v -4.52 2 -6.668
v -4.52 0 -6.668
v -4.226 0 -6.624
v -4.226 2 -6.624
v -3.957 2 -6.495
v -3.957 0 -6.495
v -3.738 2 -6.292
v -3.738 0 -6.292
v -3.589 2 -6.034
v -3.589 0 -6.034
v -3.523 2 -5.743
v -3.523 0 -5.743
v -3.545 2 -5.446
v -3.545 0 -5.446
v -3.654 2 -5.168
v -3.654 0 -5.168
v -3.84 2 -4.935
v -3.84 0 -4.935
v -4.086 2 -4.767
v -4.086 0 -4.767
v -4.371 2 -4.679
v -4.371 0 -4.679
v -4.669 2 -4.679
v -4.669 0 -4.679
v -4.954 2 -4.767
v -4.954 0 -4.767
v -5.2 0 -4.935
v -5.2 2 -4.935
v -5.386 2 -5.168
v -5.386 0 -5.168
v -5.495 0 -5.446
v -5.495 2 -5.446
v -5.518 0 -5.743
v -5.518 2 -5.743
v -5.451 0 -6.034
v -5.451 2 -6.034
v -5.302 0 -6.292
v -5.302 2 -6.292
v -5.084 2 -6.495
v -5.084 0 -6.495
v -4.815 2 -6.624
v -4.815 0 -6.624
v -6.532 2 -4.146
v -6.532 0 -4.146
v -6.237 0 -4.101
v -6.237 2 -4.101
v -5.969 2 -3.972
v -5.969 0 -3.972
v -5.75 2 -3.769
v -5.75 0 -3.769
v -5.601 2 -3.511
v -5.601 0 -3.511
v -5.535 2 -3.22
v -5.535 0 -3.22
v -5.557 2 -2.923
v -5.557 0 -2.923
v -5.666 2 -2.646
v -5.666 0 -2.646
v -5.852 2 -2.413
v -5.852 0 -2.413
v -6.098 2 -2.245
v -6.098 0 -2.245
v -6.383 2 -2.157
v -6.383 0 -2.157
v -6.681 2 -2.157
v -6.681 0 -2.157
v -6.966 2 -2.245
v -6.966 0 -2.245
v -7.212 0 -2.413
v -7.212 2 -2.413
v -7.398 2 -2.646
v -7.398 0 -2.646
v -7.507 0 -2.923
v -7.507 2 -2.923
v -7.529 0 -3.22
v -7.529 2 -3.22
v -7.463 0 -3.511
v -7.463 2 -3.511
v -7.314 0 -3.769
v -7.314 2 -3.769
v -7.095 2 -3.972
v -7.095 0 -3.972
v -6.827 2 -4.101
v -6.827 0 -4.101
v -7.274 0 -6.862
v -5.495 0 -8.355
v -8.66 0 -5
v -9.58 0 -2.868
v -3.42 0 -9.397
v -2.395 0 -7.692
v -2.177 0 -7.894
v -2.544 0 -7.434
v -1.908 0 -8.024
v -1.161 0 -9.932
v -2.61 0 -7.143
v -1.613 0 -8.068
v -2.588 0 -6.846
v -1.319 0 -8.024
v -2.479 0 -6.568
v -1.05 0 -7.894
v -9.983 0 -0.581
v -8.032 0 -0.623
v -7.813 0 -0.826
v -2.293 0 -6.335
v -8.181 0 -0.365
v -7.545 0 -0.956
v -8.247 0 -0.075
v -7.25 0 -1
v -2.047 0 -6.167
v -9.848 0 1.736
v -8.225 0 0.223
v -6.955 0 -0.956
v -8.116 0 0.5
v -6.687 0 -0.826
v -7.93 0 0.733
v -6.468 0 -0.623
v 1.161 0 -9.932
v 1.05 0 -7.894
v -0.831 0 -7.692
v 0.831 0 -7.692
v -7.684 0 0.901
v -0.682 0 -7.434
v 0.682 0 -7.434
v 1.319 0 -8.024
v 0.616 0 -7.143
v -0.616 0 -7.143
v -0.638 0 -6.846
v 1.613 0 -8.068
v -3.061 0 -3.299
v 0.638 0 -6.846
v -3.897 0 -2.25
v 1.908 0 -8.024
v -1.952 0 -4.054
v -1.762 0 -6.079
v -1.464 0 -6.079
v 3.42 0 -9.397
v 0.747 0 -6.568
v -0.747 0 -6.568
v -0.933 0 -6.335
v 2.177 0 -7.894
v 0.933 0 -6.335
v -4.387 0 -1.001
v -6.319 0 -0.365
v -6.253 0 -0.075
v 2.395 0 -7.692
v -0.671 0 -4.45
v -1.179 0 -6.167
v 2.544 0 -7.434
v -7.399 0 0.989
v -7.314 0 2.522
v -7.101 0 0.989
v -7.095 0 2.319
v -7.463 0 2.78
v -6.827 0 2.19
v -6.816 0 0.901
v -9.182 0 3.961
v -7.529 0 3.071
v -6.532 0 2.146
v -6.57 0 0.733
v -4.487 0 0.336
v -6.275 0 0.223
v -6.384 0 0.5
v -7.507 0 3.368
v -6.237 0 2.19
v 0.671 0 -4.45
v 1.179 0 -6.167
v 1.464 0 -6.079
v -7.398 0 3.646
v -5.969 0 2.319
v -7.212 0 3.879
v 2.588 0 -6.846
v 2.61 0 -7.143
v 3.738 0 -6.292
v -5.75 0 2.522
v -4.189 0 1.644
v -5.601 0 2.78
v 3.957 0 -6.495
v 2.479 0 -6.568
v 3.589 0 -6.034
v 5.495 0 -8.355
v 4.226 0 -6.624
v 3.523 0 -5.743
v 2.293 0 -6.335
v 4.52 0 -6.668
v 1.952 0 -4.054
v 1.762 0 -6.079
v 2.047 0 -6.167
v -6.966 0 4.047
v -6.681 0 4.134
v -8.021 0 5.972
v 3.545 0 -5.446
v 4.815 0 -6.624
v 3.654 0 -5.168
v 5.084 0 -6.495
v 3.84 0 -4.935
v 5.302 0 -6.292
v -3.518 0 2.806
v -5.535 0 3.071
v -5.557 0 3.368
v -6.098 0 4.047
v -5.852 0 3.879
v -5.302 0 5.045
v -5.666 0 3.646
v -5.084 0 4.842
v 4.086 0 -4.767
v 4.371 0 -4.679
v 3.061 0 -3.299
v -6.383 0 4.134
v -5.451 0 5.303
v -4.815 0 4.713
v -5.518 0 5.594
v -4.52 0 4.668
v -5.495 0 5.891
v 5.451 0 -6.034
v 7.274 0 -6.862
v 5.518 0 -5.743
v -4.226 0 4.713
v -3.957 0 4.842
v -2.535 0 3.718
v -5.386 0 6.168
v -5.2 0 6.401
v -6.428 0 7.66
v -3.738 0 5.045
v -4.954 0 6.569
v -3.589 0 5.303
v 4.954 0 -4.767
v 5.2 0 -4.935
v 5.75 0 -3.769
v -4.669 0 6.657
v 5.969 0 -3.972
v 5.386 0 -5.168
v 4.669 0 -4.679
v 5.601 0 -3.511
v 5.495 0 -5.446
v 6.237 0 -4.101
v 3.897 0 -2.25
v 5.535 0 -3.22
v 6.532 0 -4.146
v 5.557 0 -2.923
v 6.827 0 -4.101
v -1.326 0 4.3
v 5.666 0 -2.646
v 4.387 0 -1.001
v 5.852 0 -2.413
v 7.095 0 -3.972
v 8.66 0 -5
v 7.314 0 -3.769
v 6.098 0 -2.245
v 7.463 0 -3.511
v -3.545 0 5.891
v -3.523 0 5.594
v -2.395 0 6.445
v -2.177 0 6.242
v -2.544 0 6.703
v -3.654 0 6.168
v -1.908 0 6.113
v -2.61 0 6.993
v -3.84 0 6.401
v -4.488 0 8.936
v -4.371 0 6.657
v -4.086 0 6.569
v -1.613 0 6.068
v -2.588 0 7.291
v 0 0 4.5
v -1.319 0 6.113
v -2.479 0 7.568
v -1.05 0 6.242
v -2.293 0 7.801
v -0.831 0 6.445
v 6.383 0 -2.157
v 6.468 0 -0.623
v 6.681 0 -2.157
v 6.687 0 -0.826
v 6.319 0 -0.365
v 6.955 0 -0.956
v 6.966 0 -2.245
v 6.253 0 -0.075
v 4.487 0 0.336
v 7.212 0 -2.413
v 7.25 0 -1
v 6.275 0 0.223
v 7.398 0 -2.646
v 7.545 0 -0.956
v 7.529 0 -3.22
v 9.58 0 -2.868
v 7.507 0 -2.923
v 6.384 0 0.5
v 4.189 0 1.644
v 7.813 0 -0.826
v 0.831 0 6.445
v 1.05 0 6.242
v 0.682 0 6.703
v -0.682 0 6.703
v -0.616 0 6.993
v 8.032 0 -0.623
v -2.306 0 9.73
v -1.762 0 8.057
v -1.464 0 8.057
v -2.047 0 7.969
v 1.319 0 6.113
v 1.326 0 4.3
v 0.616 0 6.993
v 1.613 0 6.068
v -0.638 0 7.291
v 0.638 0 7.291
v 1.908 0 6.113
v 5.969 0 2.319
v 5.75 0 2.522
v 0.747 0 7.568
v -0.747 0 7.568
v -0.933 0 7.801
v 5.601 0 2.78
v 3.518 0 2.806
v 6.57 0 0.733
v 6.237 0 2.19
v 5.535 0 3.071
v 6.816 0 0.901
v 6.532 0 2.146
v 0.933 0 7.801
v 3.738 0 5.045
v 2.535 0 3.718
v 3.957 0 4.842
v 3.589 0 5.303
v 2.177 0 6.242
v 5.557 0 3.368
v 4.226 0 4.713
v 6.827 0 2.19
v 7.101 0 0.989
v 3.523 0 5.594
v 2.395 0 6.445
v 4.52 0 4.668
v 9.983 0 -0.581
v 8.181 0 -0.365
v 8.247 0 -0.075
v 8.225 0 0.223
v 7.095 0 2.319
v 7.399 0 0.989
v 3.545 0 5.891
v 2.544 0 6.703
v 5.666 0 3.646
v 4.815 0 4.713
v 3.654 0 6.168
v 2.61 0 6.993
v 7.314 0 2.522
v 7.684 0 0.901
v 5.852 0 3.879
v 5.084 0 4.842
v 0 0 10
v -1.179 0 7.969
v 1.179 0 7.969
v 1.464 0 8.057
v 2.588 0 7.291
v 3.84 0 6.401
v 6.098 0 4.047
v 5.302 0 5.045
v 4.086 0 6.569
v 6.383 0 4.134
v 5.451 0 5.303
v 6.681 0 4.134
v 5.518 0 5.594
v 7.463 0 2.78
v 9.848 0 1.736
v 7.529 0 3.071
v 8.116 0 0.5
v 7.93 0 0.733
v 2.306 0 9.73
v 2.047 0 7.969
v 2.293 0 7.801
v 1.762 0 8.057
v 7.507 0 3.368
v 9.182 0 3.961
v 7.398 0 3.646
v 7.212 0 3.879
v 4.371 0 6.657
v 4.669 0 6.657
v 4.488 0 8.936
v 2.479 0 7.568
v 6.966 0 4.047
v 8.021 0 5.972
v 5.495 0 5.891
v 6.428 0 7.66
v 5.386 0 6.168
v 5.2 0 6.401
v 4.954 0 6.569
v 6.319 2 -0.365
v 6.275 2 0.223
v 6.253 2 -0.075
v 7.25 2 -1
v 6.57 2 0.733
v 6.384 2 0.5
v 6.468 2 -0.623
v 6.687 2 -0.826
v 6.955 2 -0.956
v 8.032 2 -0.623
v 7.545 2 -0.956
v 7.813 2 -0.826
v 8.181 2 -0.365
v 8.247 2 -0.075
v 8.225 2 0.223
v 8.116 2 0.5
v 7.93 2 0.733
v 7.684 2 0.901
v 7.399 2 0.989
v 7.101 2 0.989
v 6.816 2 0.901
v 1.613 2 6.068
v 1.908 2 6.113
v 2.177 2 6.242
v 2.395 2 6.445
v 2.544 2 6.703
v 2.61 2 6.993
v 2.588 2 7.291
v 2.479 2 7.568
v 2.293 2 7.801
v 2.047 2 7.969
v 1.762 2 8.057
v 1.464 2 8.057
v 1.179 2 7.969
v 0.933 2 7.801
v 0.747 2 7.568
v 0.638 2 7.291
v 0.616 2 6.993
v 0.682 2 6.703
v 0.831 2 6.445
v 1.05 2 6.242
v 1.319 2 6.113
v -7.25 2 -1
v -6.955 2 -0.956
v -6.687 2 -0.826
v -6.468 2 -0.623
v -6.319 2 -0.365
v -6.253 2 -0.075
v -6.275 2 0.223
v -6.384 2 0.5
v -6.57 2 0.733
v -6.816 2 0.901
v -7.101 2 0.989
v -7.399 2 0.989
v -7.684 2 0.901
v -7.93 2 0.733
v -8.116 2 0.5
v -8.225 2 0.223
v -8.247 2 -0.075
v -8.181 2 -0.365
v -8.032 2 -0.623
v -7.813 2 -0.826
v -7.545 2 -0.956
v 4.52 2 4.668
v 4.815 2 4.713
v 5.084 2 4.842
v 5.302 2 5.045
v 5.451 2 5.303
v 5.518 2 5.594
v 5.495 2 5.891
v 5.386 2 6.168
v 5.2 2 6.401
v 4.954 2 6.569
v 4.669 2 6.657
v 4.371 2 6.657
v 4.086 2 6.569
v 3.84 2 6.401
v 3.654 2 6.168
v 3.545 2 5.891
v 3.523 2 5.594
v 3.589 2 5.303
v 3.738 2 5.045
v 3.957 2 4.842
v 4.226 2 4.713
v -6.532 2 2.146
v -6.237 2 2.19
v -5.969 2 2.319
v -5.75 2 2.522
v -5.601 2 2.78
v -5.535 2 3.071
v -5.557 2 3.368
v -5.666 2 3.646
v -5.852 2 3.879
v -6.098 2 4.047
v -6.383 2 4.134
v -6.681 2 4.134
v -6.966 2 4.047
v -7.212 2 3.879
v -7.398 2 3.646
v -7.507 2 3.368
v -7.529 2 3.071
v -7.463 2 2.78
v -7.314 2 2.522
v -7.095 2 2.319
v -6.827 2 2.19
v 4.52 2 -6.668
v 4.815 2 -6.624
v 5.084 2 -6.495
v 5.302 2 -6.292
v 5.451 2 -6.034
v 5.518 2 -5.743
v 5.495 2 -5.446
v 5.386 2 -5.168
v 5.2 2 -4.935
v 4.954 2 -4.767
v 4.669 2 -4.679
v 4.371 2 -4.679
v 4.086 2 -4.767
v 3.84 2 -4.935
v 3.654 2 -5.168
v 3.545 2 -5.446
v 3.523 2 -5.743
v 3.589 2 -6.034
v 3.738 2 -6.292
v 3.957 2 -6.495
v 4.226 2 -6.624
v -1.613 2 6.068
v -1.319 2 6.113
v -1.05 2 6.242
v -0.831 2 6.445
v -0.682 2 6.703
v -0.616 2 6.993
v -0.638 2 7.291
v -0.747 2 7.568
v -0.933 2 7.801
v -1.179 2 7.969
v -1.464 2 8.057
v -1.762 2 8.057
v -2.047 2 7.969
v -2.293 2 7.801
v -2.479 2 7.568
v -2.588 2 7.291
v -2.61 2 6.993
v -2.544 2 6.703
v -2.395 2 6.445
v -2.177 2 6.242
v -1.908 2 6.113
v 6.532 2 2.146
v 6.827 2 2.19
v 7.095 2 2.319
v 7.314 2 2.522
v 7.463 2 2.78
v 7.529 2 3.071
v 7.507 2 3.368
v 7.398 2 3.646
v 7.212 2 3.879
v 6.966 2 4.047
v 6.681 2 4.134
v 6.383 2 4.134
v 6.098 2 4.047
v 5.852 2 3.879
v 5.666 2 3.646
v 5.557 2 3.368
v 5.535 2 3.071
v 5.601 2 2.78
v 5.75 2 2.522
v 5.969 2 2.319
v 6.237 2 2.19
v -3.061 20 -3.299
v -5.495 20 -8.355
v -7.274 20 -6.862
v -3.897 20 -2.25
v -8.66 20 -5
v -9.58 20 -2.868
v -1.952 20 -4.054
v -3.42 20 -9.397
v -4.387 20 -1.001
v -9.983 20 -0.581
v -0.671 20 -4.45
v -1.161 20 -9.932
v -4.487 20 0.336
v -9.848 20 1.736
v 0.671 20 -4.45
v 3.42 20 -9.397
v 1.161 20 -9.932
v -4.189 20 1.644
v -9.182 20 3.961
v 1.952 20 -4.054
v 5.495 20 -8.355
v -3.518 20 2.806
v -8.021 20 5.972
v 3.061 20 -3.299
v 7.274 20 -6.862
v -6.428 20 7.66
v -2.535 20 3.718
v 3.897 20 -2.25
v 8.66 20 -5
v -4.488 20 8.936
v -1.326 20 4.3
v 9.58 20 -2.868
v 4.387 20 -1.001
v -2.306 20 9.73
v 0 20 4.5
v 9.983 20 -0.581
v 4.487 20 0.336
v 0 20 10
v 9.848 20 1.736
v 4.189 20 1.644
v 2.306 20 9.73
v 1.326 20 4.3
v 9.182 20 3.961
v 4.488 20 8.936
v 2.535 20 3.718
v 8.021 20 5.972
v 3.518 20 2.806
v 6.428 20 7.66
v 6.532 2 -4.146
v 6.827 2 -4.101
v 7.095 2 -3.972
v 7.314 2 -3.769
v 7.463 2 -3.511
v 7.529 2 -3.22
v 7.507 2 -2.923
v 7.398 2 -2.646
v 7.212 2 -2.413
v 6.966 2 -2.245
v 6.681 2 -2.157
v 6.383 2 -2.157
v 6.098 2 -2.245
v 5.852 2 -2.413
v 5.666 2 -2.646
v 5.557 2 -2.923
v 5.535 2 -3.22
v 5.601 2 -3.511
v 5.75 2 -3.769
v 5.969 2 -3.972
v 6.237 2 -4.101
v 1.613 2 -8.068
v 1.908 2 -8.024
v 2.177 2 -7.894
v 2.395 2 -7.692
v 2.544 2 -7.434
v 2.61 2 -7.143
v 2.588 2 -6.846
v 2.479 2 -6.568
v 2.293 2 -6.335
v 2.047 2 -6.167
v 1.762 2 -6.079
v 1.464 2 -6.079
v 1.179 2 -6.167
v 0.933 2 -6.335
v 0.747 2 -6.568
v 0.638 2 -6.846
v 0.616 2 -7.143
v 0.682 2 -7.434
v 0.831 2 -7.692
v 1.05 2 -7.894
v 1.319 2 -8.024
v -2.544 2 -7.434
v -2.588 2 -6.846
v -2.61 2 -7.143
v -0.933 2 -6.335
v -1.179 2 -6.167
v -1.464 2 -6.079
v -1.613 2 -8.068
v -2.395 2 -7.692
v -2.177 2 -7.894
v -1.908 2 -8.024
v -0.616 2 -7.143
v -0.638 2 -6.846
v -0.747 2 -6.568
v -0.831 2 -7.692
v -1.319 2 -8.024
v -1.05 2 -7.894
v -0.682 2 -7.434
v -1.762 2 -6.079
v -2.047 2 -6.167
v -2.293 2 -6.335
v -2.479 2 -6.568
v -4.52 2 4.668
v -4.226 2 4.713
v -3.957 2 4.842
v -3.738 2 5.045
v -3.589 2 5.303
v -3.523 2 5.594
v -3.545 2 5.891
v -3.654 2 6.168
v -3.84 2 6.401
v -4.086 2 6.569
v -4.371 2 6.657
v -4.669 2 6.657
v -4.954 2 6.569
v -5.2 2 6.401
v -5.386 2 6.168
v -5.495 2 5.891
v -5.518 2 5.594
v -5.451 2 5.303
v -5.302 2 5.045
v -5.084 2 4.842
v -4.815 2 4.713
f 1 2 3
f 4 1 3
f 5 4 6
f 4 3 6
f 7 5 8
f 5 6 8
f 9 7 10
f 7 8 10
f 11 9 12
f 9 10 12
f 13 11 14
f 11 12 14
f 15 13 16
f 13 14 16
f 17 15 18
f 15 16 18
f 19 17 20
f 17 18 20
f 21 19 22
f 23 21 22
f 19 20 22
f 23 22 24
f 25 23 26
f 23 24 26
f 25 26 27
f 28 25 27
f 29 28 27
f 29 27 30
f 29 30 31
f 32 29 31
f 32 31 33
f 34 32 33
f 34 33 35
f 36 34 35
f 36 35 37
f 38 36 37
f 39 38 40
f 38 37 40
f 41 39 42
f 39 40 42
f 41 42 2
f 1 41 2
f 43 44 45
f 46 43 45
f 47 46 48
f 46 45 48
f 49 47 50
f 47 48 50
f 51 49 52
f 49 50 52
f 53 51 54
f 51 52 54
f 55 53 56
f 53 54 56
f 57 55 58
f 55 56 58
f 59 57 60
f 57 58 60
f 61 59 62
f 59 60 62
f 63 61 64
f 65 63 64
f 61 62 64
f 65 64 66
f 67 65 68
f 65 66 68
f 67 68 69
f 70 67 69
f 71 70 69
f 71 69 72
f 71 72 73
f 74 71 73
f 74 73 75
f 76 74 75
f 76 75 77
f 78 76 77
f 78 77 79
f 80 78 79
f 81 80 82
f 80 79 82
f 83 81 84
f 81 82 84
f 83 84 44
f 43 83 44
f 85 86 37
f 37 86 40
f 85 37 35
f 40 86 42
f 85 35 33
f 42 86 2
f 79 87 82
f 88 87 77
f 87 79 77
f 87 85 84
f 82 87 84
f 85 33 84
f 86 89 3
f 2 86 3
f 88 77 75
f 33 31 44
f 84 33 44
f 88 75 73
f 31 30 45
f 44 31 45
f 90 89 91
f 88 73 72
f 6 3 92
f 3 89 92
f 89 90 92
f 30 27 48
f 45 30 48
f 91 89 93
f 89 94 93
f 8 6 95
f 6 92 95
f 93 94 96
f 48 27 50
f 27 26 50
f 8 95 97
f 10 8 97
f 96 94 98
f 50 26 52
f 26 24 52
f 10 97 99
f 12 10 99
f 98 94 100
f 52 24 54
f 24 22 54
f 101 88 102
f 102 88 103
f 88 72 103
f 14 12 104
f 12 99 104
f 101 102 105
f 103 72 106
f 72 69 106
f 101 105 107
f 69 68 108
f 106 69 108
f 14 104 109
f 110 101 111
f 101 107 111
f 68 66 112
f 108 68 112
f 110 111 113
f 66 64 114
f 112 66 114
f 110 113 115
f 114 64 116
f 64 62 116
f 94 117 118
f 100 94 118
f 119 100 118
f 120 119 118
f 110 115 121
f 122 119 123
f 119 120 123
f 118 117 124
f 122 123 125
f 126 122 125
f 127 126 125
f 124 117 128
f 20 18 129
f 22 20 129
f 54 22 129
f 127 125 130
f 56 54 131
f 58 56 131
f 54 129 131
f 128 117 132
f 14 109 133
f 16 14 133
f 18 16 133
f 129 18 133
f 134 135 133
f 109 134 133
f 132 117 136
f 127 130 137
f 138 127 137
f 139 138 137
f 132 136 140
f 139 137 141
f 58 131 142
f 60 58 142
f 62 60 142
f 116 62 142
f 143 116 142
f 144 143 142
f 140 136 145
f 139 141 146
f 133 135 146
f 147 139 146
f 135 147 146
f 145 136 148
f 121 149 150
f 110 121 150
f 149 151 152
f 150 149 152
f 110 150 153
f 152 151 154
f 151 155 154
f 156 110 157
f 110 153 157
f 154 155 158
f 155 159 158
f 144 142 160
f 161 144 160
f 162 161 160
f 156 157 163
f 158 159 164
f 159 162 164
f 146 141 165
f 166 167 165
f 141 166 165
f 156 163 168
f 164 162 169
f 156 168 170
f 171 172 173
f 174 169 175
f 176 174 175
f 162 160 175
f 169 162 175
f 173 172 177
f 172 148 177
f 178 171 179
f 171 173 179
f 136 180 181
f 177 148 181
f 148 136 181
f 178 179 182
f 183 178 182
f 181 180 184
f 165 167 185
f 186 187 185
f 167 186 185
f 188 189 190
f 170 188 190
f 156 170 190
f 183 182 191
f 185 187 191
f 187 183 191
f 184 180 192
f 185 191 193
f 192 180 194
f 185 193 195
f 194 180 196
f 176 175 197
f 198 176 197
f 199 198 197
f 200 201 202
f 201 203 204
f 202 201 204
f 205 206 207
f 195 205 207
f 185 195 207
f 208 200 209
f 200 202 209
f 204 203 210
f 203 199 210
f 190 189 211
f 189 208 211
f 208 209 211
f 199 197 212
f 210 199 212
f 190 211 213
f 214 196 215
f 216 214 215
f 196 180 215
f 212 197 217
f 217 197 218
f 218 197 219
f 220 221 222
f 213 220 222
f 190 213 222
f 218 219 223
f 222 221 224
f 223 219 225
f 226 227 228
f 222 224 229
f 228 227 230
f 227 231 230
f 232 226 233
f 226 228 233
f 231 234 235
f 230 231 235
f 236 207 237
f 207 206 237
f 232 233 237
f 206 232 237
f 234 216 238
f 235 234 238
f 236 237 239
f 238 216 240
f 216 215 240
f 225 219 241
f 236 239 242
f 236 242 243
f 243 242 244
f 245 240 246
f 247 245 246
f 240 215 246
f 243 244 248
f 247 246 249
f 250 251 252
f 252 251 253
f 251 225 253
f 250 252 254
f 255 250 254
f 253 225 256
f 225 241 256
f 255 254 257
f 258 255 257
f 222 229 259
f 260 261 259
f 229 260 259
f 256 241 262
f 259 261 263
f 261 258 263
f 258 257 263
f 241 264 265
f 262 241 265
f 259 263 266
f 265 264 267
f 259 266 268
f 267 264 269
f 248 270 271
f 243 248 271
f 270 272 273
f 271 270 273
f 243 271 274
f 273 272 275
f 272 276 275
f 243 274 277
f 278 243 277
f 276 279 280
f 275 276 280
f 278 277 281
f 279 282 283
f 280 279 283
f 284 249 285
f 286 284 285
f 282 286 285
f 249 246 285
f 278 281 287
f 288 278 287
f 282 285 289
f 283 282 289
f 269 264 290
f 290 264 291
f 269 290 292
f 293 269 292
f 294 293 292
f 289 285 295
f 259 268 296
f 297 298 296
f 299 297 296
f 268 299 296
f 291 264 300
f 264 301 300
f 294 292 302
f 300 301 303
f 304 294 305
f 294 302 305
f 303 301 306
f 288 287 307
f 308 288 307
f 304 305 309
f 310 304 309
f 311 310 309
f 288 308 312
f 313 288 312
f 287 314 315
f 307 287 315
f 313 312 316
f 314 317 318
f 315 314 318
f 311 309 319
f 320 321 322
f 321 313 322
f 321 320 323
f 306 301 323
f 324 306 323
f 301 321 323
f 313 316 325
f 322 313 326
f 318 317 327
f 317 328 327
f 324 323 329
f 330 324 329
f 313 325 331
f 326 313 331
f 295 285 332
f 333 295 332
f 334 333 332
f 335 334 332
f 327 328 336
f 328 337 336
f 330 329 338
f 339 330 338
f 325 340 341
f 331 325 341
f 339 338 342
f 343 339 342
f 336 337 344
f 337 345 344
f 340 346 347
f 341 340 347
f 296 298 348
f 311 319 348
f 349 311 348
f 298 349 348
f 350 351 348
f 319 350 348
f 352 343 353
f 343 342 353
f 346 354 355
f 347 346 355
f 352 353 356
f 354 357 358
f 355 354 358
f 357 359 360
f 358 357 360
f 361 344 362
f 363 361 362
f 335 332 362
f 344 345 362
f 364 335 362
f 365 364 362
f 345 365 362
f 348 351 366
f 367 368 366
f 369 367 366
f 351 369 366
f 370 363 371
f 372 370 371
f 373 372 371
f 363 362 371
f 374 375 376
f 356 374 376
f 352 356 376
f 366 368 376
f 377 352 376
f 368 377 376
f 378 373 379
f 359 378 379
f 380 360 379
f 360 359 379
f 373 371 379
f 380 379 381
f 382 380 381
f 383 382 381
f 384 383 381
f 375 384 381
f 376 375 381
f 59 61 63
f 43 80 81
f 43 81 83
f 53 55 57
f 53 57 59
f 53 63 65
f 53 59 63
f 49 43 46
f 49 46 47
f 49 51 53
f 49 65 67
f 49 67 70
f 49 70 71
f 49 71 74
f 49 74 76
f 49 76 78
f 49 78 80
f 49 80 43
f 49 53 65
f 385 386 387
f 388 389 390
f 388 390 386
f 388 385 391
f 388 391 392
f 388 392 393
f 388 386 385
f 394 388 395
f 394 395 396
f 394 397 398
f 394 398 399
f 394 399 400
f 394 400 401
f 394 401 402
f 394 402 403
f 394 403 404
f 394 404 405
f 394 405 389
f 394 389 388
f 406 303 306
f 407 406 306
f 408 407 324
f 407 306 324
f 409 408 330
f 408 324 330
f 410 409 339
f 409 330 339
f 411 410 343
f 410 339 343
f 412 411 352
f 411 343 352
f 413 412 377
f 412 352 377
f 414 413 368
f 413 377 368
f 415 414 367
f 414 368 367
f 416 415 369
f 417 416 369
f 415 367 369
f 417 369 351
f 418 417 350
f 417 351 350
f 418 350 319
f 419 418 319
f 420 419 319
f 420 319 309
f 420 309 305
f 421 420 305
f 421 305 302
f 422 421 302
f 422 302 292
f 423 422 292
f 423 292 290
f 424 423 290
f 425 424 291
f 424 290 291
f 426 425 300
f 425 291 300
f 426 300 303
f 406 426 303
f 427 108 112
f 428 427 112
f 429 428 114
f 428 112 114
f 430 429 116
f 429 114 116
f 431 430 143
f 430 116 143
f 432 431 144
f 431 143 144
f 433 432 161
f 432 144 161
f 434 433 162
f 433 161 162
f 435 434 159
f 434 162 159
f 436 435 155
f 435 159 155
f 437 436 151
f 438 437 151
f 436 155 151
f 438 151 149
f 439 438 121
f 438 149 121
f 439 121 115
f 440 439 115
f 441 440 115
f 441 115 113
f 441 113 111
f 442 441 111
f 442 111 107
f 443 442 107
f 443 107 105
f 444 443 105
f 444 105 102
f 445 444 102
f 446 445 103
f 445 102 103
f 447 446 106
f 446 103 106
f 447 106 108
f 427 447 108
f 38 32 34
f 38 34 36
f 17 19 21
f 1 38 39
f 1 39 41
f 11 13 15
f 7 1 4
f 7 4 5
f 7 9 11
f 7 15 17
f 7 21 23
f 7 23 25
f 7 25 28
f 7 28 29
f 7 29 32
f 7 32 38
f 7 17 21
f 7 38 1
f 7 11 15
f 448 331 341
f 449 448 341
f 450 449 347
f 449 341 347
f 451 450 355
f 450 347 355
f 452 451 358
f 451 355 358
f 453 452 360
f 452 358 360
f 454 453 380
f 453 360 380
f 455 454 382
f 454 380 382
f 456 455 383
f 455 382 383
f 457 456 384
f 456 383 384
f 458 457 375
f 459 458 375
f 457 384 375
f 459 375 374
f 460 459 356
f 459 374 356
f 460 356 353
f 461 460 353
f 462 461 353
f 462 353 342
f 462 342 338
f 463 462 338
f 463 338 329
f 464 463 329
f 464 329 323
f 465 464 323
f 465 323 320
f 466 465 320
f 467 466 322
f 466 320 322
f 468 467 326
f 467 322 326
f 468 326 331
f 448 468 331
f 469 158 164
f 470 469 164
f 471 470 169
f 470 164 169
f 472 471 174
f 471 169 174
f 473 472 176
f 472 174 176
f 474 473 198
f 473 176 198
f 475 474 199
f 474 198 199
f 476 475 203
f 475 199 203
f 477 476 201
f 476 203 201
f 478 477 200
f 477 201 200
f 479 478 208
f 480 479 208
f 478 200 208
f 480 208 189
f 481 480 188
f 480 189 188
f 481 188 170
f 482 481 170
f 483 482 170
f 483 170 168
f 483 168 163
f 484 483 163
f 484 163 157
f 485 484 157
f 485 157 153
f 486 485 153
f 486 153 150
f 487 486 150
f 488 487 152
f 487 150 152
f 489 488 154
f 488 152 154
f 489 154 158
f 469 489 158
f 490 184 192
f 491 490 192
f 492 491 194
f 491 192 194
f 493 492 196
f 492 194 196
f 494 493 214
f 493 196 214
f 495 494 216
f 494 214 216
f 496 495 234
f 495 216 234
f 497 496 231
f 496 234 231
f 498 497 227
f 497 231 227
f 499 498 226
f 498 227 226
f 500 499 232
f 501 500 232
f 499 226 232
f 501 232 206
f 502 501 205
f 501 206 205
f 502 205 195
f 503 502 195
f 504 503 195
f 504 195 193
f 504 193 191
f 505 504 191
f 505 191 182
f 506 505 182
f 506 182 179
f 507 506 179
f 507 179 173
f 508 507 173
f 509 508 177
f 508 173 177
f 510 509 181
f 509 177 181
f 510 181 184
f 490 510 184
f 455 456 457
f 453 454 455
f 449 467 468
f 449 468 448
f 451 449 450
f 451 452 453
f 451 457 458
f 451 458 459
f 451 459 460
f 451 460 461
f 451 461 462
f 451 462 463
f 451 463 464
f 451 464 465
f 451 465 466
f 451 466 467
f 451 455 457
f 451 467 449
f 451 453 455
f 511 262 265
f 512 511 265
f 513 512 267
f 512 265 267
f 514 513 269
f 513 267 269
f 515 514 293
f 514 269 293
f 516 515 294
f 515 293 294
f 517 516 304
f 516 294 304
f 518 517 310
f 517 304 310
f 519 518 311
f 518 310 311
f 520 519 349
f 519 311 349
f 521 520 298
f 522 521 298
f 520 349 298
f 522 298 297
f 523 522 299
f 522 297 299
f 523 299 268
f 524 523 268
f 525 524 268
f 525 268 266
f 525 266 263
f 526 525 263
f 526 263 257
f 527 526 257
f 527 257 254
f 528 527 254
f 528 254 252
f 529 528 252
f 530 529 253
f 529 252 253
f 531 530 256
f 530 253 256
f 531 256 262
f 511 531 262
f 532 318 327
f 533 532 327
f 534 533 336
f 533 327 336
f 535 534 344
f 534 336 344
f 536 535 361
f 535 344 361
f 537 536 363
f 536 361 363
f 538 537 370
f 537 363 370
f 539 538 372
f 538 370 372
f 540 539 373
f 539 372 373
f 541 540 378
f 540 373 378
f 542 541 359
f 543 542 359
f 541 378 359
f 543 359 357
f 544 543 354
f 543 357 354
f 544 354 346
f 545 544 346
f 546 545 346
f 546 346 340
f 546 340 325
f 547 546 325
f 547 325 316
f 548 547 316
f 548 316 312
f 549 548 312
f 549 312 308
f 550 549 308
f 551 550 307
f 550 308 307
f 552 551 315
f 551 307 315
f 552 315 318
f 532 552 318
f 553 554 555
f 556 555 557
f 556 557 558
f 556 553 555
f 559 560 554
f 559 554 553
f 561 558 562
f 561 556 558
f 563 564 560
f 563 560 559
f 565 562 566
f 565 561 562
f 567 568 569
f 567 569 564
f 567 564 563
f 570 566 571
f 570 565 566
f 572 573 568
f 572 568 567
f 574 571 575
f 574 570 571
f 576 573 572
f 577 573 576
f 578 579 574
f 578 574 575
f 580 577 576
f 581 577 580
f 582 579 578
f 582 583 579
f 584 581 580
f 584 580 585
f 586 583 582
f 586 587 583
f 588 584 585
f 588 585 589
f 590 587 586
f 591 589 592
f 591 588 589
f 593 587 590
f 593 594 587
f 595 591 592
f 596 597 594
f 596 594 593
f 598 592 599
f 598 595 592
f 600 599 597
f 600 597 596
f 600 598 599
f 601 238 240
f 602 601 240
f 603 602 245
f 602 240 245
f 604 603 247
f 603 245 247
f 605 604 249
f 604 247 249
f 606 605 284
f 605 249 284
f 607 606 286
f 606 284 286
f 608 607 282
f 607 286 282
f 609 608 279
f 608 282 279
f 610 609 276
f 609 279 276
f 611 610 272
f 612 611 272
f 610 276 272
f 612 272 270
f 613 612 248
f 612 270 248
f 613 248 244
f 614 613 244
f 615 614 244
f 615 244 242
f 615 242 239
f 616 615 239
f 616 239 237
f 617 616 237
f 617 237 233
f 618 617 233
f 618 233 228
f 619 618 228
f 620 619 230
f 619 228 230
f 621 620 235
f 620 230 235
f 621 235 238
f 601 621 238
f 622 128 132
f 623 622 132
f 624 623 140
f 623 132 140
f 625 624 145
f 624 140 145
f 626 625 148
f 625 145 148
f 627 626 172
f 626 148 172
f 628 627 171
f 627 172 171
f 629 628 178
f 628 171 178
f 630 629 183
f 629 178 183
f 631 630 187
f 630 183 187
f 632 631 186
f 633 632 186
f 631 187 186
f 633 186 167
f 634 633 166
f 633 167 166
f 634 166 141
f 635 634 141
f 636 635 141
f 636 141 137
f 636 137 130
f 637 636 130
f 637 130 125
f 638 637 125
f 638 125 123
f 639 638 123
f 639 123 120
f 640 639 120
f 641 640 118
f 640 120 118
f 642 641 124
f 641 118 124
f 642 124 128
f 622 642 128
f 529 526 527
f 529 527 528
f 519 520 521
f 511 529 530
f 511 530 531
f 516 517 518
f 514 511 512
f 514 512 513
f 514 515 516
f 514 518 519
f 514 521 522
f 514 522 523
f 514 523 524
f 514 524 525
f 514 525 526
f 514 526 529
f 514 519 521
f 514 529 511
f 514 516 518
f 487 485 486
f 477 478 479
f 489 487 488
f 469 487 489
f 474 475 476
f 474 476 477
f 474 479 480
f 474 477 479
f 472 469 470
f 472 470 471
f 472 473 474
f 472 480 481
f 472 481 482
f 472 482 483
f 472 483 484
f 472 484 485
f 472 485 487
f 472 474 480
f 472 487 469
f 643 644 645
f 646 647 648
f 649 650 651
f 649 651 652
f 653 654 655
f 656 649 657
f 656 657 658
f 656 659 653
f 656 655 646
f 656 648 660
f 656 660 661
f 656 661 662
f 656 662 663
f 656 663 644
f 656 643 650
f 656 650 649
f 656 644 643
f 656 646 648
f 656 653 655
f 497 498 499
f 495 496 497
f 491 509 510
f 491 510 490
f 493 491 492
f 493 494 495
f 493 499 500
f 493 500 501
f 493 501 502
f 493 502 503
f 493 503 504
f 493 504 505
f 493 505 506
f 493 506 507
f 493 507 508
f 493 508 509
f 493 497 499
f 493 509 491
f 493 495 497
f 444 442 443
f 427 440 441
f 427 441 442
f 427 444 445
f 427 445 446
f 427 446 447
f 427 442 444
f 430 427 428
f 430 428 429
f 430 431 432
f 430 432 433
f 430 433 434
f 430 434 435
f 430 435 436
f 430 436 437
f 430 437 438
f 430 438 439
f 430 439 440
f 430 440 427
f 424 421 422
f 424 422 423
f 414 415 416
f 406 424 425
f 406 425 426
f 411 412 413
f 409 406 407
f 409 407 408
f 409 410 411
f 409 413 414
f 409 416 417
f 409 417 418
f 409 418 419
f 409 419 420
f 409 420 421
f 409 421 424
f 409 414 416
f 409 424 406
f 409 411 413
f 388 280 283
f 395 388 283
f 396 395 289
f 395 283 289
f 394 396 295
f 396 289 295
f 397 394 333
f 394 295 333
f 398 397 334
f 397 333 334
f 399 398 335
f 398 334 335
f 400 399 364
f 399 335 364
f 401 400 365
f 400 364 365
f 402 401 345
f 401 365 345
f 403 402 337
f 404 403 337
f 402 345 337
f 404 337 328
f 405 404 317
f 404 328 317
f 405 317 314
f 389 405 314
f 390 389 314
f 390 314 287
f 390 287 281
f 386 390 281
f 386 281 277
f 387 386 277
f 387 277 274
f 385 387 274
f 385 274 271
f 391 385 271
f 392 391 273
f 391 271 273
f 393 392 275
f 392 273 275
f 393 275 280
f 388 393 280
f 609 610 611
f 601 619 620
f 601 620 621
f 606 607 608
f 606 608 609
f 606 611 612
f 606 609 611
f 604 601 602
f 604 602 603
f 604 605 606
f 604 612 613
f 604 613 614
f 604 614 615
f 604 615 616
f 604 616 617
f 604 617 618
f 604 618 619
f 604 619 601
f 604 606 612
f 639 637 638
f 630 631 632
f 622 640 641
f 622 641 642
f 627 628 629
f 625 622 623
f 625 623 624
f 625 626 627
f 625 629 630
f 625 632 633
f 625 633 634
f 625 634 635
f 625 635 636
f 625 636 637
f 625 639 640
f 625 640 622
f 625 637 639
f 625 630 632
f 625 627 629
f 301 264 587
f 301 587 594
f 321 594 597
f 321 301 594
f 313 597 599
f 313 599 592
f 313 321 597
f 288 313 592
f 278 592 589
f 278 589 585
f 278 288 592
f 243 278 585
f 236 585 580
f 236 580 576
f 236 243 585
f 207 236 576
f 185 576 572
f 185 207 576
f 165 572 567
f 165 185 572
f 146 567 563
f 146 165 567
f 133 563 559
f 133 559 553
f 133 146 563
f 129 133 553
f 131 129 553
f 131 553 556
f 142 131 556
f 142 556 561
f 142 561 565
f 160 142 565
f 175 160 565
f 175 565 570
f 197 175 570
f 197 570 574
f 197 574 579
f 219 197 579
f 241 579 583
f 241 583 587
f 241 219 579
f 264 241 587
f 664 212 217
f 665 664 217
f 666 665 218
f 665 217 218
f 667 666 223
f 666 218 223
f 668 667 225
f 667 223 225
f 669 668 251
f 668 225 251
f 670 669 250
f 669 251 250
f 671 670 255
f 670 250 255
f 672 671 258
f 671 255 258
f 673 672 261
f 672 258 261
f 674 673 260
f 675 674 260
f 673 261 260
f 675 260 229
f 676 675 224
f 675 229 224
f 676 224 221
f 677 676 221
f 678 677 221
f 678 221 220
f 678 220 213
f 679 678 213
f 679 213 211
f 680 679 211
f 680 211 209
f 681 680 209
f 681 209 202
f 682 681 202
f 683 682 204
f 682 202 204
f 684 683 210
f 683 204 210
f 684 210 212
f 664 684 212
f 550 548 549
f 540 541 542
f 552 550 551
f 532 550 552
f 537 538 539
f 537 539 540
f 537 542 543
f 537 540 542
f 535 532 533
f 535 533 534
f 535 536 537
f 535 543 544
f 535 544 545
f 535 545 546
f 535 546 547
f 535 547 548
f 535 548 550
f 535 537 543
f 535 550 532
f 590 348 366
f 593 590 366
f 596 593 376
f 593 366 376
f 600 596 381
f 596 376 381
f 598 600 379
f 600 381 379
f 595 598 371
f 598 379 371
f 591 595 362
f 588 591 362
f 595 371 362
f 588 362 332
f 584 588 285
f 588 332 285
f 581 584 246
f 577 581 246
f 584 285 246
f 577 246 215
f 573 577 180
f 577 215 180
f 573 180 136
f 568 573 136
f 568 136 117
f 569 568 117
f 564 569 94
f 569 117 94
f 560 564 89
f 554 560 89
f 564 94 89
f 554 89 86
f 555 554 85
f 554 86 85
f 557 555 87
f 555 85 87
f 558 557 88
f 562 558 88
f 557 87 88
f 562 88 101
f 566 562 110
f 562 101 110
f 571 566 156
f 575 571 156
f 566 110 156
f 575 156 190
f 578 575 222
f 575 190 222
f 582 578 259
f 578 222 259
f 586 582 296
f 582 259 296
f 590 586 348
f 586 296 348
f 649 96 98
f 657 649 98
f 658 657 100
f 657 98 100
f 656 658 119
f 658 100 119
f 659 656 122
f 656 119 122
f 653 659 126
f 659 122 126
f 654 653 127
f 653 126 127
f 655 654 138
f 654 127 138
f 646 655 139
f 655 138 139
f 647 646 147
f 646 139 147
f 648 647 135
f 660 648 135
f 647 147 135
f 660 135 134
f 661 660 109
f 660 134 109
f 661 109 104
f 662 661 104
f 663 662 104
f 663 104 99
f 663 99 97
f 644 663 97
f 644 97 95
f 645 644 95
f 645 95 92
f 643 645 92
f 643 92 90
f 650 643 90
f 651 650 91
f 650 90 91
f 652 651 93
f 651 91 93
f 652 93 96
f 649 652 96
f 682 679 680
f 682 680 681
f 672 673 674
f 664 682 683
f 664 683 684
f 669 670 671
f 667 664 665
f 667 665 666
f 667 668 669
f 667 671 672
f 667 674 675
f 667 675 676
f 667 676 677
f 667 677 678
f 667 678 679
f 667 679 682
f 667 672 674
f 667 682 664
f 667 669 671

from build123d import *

# Parameters (mm, degrees)
SKETCH1_R           = 10
SKETCH1_R_2         = 4.5
BOSS_EXTRUDE1_DEPTH = 20
SKETCH2_R           = 1
CUT_EXTRUDE1_DEPTH  = 2


with BuildPart() as part:
    # Sketch1 → Boss-Extrude1 (new body)
    with BuildSketch(Plane(origin=(0, 0, 0), x_dir=(1, 0, 0), z_dir=(0, 1, 0))):
        with Locations(Location((0, 0, 0), (0, 0, 270))):
            Circle(SKETCH1_R)
        with Locations(Location((0, 0, 0), (0, 0, 270))):
            Circle(SKETCH1_R_2, mode=Mode.SUBTRACT)
    extrude(amount=BOSS_EXTRUDE1_DEPTH)

    # Sketch2 → Cut-Extrude1 (cut)
    with BuildSketch(Plane.XZ):
        with Locations(Location((-7.25, 0, 0), (0, 0, 270))):
            Circle(SKETCH2_R)
        with Locations(Location((-6.532024292, 3.145657109, 0), (0, 0, 270))):
            Circle(SKETCH2_R)
        with Locations(Location((-4.520301063, 5.668278248, 0), (0, 0, 270))):
            Circle(SKETCH2_R)
        with Locations(Location((-1.613276771, 7.068227363, 0), (0, 0, 270))):
            Circle(SKETCH2_R)
        with Locations(Location((1.613276771, 7.068227363, 0), (0, 0, 270))):
            Circle(SKETCH2_R)
        with Locations(Location((4.520301063, 5.668278248, 0), (0, 0, 270))):
            Circle(SKETCH2_R)
        with Locations(Location((6.532024292, 3.145657109, 0), (0, 0, 270))):
            Circle(SKETCH2_R)
        with Locations(Location((7.25, 0, 0), (0, 0, 270))):
            Circle(SKETCH2_R)
        with Locations(Location((6.532024292, -3.145657109, 0), (0, 0, 270))):
            Circle(SKETCH2_R)
        with Locations(Location((4.520301063, -5.668278248, 0), (0, 0, 270))):
            Circle(SKETCH2_R)
        with Locations(Location((1.613276771, -7.068227363, 0), (0, 0, 270))):
            Circle(SKETCH2_R)
        with Locations(Location((-1.613276771, -7.068227363, 0), (0, 0, 270))):
            Circle(SKETCH2_R)
        with Locations(Location((-4.520301063, -5.668278248, 0), (0, 0, 270))):
            Circle(SKETCH2_R)
        with Locations(Location((-6.532024292, -3.145657109, 0), (0, 0, 270))):
            Circle(SKETCH2_R)
    extrude(amount=-CUT_EXTRUDE1_DEPTH, mode=Mode.SUBTRACT)


solid = part.part
